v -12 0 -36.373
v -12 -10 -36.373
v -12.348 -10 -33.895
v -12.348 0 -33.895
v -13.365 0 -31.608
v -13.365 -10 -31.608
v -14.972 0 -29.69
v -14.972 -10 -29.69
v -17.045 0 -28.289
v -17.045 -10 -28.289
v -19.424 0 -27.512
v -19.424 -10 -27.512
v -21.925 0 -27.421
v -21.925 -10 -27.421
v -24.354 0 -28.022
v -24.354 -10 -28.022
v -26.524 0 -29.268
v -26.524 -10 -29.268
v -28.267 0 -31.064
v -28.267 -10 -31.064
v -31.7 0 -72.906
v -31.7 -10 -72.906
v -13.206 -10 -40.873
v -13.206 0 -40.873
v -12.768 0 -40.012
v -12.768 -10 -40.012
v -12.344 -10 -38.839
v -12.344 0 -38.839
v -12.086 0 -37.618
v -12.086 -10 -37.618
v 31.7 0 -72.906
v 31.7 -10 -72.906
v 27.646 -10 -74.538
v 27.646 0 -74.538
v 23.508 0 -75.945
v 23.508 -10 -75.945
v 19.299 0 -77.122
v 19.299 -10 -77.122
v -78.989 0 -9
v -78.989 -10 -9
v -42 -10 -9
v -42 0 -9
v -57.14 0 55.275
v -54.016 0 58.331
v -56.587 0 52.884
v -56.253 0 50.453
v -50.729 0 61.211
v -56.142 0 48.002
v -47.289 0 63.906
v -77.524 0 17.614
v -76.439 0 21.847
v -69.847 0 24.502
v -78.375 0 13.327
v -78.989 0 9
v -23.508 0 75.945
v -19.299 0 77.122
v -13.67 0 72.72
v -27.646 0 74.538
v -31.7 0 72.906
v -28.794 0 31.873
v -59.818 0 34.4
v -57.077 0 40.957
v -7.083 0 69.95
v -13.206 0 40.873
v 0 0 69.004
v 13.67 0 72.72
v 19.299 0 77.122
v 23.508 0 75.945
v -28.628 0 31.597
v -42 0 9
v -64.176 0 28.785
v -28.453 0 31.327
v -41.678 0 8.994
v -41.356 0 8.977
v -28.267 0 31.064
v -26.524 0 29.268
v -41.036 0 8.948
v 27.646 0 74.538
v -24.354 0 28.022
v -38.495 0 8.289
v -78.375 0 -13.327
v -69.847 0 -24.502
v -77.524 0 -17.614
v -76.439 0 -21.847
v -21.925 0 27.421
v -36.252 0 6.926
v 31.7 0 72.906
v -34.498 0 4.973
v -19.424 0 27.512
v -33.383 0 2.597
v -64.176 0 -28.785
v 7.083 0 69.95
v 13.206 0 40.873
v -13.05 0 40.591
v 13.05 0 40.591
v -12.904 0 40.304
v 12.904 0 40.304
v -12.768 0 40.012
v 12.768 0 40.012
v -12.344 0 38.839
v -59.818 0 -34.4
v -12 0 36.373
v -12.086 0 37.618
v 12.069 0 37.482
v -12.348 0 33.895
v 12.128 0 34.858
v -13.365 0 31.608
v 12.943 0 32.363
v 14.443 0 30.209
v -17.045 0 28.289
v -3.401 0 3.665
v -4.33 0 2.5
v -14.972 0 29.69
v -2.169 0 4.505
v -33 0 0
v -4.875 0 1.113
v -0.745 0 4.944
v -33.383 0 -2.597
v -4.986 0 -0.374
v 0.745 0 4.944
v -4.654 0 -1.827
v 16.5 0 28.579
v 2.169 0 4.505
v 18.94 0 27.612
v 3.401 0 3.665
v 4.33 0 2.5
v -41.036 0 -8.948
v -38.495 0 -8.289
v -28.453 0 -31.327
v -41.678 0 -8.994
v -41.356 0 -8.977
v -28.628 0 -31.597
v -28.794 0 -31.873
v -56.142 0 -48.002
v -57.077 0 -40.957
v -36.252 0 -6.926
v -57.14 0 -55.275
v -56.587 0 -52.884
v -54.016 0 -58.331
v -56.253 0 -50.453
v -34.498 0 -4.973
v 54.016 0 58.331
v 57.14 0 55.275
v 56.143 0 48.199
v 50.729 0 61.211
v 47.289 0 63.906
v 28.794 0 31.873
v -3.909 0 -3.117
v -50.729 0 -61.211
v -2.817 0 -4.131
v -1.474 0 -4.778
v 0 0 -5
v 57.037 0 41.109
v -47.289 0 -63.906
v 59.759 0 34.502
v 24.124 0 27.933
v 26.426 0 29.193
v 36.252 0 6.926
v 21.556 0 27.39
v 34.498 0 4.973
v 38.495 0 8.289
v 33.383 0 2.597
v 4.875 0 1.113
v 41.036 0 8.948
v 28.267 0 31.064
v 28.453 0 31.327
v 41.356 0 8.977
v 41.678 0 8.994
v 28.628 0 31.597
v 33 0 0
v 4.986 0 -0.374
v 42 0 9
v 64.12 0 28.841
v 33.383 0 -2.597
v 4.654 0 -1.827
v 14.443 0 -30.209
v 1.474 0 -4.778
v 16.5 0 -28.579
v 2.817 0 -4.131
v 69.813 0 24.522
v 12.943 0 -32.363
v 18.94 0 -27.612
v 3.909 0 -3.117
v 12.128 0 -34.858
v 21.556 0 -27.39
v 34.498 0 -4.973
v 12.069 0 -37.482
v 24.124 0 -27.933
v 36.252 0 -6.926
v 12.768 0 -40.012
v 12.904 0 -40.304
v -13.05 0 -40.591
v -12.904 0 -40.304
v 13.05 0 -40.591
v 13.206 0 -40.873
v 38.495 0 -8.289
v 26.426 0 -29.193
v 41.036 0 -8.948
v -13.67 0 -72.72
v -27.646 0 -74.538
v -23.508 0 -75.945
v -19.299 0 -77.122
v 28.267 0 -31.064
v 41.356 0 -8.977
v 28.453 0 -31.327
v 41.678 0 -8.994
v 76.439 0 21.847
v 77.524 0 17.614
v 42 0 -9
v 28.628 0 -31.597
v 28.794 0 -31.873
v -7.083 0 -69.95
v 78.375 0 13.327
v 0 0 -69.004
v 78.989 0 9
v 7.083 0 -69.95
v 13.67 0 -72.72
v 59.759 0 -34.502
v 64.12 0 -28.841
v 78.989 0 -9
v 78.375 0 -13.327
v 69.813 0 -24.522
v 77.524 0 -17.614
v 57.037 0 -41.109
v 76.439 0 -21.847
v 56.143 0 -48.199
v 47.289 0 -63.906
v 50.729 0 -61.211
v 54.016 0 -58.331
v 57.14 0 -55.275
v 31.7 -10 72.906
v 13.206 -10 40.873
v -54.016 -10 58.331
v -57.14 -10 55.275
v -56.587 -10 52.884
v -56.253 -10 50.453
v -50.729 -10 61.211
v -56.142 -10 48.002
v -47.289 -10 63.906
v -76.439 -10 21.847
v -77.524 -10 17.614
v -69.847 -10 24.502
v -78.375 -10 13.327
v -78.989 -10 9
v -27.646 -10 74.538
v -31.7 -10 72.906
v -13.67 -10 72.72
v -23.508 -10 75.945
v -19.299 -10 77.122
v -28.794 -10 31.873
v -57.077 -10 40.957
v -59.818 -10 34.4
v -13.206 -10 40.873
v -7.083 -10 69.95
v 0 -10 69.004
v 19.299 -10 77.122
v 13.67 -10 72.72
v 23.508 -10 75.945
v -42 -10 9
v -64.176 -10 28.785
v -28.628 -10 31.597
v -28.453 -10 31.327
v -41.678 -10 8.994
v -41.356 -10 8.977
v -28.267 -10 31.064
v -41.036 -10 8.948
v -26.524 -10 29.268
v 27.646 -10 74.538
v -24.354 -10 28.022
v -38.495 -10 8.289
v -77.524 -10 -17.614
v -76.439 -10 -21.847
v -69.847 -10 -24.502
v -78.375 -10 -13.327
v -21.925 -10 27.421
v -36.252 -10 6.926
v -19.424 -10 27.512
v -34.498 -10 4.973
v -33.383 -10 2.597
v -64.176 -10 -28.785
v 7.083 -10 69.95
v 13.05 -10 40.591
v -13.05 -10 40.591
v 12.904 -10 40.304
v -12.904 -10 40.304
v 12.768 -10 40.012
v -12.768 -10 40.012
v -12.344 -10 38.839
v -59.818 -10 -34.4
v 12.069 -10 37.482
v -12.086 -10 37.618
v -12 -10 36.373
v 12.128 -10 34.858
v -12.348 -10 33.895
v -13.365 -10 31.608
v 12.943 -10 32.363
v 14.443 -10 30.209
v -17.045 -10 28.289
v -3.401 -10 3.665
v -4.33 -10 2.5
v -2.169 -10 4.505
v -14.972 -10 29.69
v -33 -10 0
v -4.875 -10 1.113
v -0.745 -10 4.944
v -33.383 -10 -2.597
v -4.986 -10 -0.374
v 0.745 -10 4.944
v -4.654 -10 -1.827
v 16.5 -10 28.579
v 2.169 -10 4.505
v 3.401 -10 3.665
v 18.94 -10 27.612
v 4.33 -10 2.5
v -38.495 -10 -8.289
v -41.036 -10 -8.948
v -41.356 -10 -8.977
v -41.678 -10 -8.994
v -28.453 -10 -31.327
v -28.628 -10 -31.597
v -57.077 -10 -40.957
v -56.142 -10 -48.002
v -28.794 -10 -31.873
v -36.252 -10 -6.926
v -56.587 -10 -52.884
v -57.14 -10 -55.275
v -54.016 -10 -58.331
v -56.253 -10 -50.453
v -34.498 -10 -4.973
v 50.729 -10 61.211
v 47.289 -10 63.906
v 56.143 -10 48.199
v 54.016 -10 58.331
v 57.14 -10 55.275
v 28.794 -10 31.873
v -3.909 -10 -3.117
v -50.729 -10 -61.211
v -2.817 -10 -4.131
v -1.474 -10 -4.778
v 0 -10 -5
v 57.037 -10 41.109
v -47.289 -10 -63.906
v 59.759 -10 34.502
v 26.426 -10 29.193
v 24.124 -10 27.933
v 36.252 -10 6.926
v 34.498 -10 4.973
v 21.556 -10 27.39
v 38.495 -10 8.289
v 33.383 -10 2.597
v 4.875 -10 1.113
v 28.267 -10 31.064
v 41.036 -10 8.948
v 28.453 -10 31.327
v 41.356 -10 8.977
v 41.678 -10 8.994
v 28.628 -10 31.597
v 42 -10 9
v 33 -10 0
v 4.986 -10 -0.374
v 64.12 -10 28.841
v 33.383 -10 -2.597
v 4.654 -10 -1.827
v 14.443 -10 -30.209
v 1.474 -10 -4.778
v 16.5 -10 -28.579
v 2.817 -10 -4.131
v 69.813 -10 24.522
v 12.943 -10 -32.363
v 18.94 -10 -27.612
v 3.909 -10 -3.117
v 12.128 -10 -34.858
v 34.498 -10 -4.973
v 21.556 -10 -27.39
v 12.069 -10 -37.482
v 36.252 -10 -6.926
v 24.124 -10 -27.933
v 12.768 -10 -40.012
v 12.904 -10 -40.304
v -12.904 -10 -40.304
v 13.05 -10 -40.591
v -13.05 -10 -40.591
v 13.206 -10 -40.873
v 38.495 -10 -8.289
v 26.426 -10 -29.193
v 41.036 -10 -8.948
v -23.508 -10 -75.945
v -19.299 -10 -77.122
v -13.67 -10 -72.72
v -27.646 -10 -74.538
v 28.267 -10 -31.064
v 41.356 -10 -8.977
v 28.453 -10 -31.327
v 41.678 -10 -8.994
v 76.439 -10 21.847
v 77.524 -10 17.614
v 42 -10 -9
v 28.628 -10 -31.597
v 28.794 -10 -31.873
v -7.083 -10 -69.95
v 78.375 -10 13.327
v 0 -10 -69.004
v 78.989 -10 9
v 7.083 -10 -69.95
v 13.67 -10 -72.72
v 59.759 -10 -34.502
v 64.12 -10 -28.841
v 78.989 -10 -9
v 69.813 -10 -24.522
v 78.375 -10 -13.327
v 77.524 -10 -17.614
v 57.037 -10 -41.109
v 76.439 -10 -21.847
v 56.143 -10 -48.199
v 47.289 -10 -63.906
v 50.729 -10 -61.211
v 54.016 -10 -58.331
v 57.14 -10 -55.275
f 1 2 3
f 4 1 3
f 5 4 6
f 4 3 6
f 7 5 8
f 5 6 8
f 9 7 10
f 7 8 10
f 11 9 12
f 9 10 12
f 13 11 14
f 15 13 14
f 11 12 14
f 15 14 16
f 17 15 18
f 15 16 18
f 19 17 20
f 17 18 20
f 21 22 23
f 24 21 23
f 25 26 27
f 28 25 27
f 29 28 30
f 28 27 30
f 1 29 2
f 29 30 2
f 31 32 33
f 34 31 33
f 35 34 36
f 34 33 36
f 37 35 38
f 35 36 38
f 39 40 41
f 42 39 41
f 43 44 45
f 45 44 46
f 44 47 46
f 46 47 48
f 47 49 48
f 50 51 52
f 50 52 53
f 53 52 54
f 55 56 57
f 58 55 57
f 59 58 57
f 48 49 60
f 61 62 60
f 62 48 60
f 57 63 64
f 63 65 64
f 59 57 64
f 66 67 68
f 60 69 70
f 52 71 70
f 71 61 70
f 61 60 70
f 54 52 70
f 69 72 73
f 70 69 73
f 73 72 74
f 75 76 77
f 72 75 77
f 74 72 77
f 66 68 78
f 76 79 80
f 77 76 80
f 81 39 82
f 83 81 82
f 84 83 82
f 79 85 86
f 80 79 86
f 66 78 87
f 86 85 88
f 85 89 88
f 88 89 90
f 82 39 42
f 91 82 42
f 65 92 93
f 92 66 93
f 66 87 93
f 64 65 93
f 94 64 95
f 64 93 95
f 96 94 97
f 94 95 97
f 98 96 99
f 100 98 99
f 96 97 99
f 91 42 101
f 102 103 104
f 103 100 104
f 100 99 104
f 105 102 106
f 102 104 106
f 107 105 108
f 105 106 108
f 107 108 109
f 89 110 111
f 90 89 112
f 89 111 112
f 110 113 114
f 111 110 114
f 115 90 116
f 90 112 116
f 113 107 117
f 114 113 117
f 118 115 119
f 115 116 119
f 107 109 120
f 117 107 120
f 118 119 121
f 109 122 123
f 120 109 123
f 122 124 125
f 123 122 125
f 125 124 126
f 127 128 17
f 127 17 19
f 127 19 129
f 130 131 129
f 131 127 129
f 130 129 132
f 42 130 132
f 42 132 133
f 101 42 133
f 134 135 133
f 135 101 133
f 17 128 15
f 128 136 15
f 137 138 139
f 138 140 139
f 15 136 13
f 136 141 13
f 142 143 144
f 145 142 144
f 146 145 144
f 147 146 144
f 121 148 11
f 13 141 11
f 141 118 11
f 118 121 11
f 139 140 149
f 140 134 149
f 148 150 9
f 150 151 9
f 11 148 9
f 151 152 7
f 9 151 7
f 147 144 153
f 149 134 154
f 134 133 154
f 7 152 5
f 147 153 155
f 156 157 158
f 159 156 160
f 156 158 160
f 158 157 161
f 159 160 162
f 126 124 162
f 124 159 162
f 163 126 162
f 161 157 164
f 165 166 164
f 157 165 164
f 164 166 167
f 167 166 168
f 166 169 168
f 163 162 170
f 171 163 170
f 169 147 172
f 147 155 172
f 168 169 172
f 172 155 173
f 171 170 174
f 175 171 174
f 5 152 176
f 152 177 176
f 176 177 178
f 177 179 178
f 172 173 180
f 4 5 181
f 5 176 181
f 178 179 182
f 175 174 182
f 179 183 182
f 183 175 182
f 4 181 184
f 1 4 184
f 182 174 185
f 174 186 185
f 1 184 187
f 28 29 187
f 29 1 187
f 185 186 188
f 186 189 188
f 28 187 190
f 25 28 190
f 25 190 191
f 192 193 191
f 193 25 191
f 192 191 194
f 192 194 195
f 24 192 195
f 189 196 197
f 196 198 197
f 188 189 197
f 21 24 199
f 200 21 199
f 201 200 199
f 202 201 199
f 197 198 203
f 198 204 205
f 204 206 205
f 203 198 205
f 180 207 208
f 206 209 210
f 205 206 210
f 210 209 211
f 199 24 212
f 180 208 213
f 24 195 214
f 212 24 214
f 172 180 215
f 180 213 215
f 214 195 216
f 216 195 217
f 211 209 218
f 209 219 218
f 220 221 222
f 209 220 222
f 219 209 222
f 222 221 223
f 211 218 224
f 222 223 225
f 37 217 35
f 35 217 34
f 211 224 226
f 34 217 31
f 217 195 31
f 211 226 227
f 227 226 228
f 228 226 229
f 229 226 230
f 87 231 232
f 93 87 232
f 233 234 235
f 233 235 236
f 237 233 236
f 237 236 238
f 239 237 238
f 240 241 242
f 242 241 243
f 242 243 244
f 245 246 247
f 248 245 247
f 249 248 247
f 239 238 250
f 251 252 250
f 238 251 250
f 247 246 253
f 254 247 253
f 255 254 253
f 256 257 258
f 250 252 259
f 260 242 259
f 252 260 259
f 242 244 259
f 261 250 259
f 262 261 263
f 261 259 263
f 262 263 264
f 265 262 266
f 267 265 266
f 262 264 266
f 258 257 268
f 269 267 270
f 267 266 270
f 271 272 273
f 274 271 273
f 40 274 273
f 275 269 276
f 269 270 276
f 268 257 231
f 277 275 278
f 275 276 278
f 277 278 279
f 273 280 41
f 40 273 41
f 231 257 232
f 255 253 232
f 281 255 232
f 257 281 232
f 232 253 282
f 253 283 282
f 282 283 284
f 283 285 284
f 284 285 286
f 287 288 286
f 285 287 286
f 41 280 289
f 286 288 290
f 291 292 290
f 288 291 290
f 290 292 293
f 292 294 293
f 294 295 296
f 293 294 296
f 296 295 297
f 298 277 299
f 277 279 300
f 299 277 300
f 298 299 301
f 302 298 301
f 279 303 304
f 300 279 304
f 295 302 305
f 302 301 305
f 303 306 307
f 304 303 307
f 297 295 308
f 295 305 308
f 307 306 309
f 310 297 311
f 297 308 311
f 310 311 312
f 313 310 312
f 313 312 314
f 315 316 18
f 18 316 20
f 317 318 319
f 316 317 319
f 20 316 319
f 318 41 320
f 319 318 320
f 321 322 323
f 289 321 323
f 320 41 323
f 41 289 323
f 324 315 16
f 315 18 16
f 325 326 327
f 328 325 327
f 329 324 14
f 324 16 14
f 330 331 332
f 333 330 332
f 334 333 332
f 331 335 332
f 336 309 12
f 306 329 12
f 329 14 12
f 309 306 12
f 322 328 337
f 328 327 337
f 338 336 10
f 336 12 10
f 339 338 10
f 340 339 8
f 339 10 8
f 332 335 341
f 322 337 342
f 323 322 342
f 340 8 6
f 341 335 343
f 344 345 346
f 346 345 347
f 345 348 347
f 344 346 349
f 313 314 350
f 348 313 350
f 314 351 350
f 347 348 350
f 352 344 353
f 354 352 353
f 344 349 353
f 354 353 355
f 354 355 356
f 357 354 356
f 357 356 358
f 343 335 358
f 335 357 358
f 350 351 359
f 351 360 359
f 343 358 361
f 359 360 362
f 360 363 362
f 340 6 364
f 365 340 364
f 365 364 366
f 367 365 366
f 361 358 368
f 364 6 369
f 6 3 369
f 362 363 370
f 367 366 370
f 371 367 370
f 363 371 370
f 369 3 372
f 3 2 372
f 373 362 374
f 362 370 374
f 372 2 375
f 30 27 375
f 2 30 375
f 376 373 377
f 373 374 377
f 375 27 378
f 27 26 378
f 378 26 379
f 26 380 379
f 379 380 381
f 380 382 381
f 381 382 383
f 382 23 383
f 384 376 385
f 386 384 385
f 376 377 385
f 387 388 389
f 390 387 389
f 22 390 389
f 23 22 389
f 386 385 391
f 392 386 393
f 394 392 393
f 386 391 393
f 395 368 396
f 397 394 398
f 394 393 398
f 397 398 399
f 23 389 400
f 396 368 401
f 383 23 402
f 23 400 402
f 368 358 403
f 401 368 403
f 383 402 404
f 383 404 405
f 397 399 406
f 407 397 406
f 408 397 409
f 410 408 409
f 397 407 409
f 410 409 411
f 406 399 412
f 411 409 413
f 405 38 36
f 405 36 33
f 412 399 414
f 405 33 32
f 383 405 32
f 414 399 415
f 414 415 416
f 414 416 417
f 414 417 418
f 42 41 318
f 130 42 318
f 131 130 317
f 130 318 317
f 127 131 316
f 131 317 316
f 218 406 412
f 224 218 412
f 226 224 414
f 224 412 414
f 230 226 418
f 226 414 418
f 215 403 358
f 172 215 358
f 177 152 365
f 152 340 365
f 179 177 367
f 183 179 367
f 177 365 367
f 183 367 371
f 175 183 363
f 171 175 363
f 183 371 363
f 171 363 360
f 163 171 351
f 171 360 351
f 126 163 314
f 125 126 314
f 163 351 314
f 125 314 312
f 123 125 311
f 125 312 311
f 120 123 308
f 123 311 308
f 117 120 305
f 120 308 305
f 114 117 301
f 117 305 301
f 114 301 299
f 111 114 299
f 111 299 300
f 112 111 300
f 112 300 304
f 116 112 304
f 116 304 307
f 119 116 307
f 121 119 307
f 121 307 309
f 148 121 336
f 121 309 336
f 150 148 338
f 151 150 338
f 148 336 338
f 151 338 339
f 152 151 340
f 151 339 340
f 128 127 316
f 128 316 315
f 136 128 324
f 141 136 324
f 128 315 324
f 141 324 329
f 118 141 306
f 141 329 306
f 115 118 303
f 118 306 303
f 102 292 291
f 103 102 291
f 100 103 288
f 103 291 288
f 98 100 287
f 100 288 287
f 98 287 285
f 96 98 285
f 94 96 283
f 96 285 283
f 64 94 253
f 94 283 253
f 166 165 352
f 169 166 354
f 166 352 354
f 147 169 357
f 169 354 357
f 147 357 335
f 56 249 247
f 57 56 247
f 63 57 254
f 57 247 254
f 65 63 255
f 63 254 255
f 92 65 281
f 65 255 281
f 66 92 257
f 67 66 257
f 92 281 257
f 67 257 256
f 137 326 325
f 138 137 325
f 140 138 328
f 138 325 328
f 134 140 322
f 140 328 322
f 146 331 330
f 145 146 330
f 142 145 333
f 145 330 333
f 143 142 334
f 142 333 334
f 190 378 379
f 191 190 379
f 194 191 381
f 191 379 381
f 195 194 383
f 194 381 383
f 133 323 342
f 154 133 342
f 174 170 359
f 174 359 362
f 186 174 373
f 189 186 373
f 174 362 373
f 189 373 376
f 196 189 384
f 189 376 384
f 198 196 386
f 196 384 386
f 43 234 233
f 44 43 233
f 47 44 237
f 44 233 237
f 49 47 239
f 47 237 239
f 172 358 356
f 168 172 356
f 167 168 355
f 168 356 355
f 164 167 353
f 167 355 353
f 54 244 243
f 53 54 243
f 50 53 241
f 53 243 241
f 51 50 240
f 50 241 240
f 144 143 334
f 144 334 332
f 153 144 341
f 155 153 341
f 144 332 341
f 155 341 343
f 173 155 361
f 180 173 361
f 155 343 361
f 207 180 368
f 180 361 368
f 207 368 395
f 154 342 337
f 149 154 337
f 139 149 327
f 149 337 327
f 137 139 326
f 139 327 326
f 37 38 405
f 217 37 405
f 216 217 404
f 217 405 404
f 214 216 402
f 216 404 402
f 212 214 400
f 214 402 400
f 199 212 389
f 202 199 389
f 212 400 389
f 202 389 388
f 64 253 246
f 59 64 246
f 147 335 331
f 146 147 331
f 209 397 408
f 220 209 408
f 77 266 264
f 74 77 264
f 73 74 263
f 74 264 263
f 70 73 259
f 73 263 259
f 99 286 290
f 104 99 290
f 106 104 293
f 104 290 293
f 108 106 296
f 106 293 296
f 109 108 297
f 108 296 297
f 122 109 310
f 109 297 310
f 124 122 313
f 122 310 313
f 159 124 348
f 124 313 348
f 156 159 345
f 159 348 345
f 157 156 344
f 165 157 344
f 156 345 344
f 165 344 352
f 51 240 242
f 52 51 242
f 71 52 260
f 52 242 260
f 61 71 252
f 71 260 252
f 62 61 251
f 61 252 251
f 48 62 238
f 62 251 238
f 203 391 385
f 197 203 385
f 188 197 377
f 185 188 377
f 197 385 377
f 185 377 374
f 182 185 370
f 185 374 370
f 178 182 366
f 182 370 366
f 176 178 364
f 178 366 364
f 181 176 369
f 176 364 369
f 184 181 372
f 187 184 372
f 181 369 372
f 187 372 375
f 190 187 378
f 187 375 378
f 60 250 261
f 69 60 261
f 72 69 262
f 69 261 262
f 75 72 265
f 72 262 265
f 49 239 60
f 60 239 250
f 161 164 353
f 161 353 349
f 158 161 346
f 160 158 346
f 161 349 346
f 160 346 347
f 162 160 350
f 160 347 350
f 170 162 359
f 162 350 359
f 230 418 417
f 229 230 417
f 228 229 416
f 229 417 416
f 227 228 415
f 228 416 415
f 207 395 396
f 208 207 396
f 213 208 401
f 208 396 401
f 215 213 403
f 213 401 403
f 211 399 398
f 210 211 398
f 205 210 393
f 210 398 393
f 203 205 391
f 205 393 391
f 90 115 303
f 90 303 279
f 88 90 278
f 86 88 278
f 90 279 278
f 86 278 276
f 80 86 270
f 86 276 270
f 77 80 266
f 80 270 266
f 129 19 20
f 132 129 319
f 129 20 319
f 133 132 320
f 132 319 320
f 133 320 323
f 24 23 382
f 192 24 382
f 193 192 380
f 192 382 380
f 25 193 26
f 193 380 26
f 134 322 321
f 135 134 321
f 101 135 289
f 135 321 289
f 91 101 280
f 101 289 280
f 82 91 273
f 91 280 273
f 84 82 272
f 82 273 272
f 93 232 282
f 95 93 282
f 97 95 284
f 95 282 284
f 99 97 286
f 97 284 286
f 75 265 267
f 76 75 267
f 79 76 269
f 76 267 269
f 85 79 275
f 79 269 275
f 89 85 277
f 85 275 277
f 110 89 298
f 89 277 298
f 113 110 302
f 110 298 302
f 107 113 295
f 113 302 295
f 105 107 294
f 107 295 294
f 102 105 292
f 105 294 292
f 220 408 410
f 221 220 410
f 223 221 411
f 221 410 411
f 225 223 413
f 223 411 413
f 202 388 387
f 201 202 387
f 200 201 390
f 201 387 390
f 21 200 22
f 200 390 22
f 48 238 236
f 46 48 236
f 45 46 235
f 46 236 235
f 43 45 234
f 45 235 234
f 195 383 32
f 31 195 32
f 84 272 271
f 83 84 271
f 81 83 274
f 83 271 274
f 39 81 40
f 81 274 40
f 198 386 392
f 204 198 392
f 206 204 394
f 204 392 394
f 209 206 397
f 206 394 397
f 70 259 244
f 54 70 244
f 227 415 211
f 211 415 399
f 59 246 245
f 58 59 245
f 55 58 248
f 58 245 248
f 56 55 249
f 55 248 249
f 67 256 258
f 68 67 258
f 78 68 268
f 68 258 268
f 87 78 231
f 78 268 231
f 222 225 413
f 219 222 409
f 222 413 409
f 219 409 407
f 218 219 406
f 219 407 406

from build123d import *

# Parameters (mm, degrees)
EXTRUDE_2_DEPTH     = 10
SCALE_2_SCALE       = 3
SKETCH_5_W          = 154.243752884
SKETCH_5_H          = 20
CUT_EXTRUDE_1_DEPTH = 113.5
SKETCH_6_R          = 5
CUT_EXTRUDE_2_DEPTH = 113.5


with BuildPart() as part:
    # 草图4 → 凸台-拉伸2 (new body)
    with BuildSketch(Plane(origin=(0, 0, 0), x_dir=(1, 0, 0), z_dir=(0, 1, 0))):
        with BuildLine():
            ThreePointArc((-13.678571429, 2.982730909), (-12.124355653, 7), (-9.422406454, 10.35462489))
            ThreePointArc((-9.422406454, 10.35462489), (-9.513861615, 10.487132461), (-9.598076211, 10.624355653))
            Line((-9.598076211, 10.624355653), (-15.762896757, 21.302138058))
            ThreePointArc((-15.762896757, 21.302138058), (-17.464105133, 19.93125766), (-19.046604272, 18.424897983))
            ThreePointArc((-19.046604272, 18.424897983), (-18.7975102, 17.224138351), (-18.71396178, 16.000663294))
            ThreePointArc((-18.71396178, 16.000663294), (-20.603825728, 10.482877024), (-25.479731852, 7.282394164))
            ThreePointArc((-25.479731852, 7.282394164), (-25.993028029, 5.158729869), (-26.329641091, 3))
            Line((-26.329641091, 3), (-14, 3))
            ThreePointArc((-14, 3), (-13.839053931, 2.995679616), (-13.678571429, 2.982730909))
        make_face()
        with BuildLine():
            ThreePointArc((13.678571429, -2.982730909), (11.767928573, -2.004459314), (11, 0))
            Line((11, 0), (0, 0))
            Line((0, 0), (12.124355653, 7))
            ThreePointArc((12.124355653, 7), (10.903170014, 8.781849671), (9.422406454, 10.35462489))
            ThreePointArc((9.422406454, 10.35462489), (5.5, 9.526279442), (4.256164975, 13.337355799))
            ThreePointArc((4.256164975, 13.337355799), (0, 14), (-4.256164975, 13.337355799))
            ThreePointArc((-4.256164975, 13.337355799), (-4.064739784, 12.744232626), (-4, 12.124355653))
            ThreePointArc((-4, 12.124355653), (-6.069199098, 9.272407252), (-9.422406454, 10.35462489))
            ThreePointArc((-9.422406454, 10.35462489), (-12.124355653, 7), (-13.678571429, 2.982730909))
            ThreePointArc((-13.678571429, 2.982730909), (-11.767928573, 2.004459314), (-11, 0))
            ThreePointArc((-11, 0), (-11.767928573, -2.004459314), (-13.678571429, -2.982730909))
            ThreePointArc((-13.678571429, -2.982730909), (-12.124355653, -7), (-9.422406454, -10.35462489))
            ThreePointArc((-9.422406454, -10.35462489), (-6.069199098, -9.272407252), (-4, -12.124355653))
            ThreePointArc((-4, -12.124355653), (-4.064739784, -12.744232626), (-4.256164975, -13.337355799))
            ThreePointArc((-4.256164975, -13.337355799), (0, -14), (4.256164975, -13.337355799))
            ThreePointArc((4.256164975, -13.337355799), (5.5, -9.526279442), (9.422406454, -10.35462489))
            ThreePointArc((9.422406454, -10.35462489), (12.124355653, -7), (13.678571429, -2.982730909))
        make_face()
        with BuildLine():
            ThreePointArc((-4.256164975, 13.337355799), (0, 14), (4.256164975, 13.337355799))
            ThreePointArc((4.256164975, 13.337355799), (4.325192316, 13.482812077), (4.401923789, 13.624355653))
            Line((4.401923789, 13.624355653), (10.566744334, 24.302138058))
            ThreePointArc((10.566744334, 24.302138058), (8.528922897, 25.089987529), (6.433127579, 25.707292147))
            ThreePointArc((6.433127579, 25.707292147), (0, 23.001326589), (-6.433127579, 25.707292147))
            ThreePointArc((-6.433127579, 25.707292147), (-8.528922897, 25.089987529), (-10.566744334, 24.302138058))
            Line((-10.566744334, 24.302138058), (-4.401923789, 13.624355653))
            ThreePointArc((-4.401923789, 13.624355653), (-4.325192316, 13.482812077), (-4.256164975, 13.337355799))
        make_face()
        with BuildLine():
            ThreePointArc((9.422406454, 10.35462489), (10.903170014, 8.781849671), (12.124355653, 7))
            Line((12.124355653, 7), (19.919733146, 11.500663294))
            ThreePointArc((19.919733146, 11.500663294), (18.784672274, 14.874701965), (19.046604272, 18.424897983))
            ThreePointArc((19.046604272, 18.424897983), (17.464105133, 19.93125766), (15.762896757, 21.302138058))
            Line((15.762896757, 21.302138058), (9.598076211, 10.624355653))
            ThreePointArc((9.598076211, 10.624355653), (9.513861615, 10.487132461), (9.422406454, 10.35462489))
        make_face()
        with BuildLine():
            ThreePointArc((12.124355653, 7), (13.056889914, 5.051497379), (13.678571429, 2.982730909))
            ThreePointArc((13.678571429, 2.982730909), (13.839053931, 2.995679616), (14, 3))
            Line((14, 3), (26.329641091, 3))
            ThreePointArc((26.329641091, 3), (25.993028029, 5.158729869), (25.479731852, 7.282394164))
            ThreePointArc((25.479731852, 7.282394164), (22.274205913, 8.830652409), (19.919733146, 11.500663294))
            Line((19.919733146, 11.500663294), (12.124355653, 7))
        make_face()
        with BuildLine():
            ThreePointArc((14, -3), (13.839053931, -2.995679616), (13.678571429, -2.982730909))
            ThreePointArc((13.678571429, -2.982730909), (12.124355653, -7), (9.422406454, -10.35462489))
            ThreePointArc((9.422406454, -10.35462489), (9.513861615, -10.487132461), (9.598076211, -10.624355653))
            Line((9.598076211, -10.624355653), (15.762896757, -21.302138058))
            ThreePointArc((15.762896757, -21.302138058), (17.464105133, -19.93125766), (19.046604272, -18.424897983))
            ThreePointArc((19.046604272, -18.424897983), (19.919733146, -11.500663294), (25.479731852, -7.282394164))
            ThreePointArc((25.479731852, -7.282394164), (25.993028029, -5.158729869), (26.329641091, -3))
            Line((26.329641091, -3), (14, -3))
        make_face()
        with BuildLine():
            ThreePointArc((4.401923789, -13.624355653), (4.325192316, -13.482812077), (4.256164975, -13.337355799))
            ThreePointArc((4.256164975, -13.337355799), (0, -14), (-4.256164975, -13.337355799))
            ThreePointArc((-4.256164975, -13.337355799), (-4.325192316, -13.482812077), (-4.401923789, -13.624355653))
            Line((-4.401923789, -13.624355653), (-10.566744334, -24.302138058))
            ThreePointArc((-10.566744334, -24.302138058), (-8.528922897, -25.089987529), (-6.433127579, -25.707292147))
            ThreePointArc((-6.433127579, -25.707292147), (0, -23.001326589), (6.433127579, -25.707292147))
            ThreePointArc((6.433127579, -25.707292147), (8.528922897, -25.089987529), (10.566744334, -24.302138058))
            Line((10.566744334, -24.302138058), (4.401923789, -13.624355653))
        make_face()
        with BuildLine():
            ThreePointArc((-9.598076211, -10.624355653), (-9.513861615, -10.487132461), (-9.422406454, -10.35462489))
            ThreePointArc((-9.422406454, -10.35462489), (-12.124355653, -7), (-13.678571429, -2.982730909))
            ThreePointArc((-13.678571429, -2.982730909), (-13.839053931, -2.995679616), (-14, -3))
            Line((-14, -3), (-26.329641091, -3))
            ThreePointArc((-26.329641091, -3), (-25.993028029, -5.158729869), (-25.479731852, -7.282394164))
            ThreePointArc((-25.479731852, -7.282394164), (-20.603825728, -10.482877024), (-18.71396178, -16.000663294))
            ThreePointArc((-18.71396178, -16.000663294), (-18.7975102, -17.224138351), (-19.046604272, -18.424897983))
            ThreePointArc((-19.046604272, -18.424897983), (-17.464105133, -19.93125766), (-15.762896757, -21.302138058))
            Line((-15.762896757, -21.302138058), (-9.598076211, -10.624355653))
        make_face()
        with BuildLine():
            Line((0, 0), (11, 0))
            ThreePointArc((11, 0), (11.767928573, 2.004459314), (13.678571429, 2.982730909))
            ThreePointArc((13.678571429, 2.982730909), (13.056889914, 5.051497379), (12.124355653, 7))
            Line((12.124355653, 7), (0, 0))
        make_face()
    extrude(amount=EXTRUDE_2_DEPTH)


with BuildPart() as part_1:
    # 缩放比例2: scaled about (0, 5, 0)
    add(part.part.scale(SCALE_2_SCALE).moved(Location((0, -10, 0))))

    # 草图5 → 切除-拉伸1 (cut, symmetric)
    with BuildSketch(Plane(origin=(0, 0, 0), x_dir=(0, 0, -1), z_dir=(1, 0, 0))):
        with Locations((0, 10)):
            Rectangle(SKETCH_5_W, SKETCH_5_H)
    extrude(amount=CUT_EXTRUDE_1_DEPTH, both=True, mode=Mode.SUBTRACT)

    # 草图6 → 切除-拉伸2 (cut, symmetric)
    with BuildSketch(Plane.XZ.offset(10)):
        with Locations(Location((0, 0, 0), (0, 0, 270))):
            Circle(SKETCH_6_R)
    extrude(amount=CUT_EXTRUDE_2_DEPTH, both=True, mode=Mode.SUBTRACT)


solid = part_1.part
